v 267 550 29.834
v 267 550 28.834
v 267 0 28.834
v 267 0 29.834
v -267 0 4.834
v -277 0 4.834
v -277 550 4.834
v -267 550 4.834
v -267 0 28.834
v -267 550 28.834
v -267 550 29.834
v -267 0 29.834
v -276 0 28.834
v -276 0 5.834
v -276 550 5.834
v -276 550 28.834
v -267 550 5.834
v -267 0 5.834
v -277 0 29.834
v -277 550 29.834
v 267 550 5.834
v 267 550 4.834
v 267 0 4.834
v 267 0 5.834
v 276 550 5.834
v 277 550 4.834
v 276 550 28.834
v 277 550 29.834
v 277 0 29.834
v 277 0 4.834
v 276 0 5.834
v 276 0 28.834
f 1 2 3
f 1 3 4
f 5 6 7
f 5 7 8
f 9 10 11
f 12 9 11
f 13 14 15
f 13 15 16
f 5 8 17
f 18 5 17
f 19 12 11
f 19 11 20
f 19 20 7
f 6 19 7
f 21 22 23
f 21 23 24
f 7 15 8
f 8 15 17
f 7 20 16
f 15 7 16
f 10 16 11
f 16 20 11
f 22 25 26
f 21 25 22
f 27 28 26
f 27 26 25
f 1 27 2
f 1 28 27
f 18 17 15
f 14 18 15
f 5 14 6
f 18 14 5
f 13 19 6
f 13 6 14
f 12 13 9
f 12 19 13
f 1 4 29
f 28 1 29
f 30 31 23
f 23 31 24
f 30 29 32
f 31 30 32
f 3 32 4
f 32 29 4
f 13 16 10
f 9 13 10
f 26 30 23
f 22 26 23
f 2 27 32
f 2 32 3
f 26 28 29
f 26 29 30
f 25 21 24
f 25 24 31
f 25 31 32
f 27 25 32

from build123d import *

# Parameters (mm, degrees)
F1_DEPTH = 550


with BuildPart() as f1:
    # F0 (on Front) → F1 (new body)
    with BuildSketch(Plane.XZ):
        Polygon((-267, 29.834287), (-277, 29.834287), (-277, 4.834287), (-267, 4.834287), (-267, 5.834287), (-276, 5.834287), (-276, 28.834287), (-267, 28.834287), align=None)
    extrude(amount=-F1_DEPTH)


with BuildPart() as f2_1:
    # F2: instance of F1
    add(f1.part.mirror(Plane.YZ))


solid = Compound([f1.part, f2_1.part])
